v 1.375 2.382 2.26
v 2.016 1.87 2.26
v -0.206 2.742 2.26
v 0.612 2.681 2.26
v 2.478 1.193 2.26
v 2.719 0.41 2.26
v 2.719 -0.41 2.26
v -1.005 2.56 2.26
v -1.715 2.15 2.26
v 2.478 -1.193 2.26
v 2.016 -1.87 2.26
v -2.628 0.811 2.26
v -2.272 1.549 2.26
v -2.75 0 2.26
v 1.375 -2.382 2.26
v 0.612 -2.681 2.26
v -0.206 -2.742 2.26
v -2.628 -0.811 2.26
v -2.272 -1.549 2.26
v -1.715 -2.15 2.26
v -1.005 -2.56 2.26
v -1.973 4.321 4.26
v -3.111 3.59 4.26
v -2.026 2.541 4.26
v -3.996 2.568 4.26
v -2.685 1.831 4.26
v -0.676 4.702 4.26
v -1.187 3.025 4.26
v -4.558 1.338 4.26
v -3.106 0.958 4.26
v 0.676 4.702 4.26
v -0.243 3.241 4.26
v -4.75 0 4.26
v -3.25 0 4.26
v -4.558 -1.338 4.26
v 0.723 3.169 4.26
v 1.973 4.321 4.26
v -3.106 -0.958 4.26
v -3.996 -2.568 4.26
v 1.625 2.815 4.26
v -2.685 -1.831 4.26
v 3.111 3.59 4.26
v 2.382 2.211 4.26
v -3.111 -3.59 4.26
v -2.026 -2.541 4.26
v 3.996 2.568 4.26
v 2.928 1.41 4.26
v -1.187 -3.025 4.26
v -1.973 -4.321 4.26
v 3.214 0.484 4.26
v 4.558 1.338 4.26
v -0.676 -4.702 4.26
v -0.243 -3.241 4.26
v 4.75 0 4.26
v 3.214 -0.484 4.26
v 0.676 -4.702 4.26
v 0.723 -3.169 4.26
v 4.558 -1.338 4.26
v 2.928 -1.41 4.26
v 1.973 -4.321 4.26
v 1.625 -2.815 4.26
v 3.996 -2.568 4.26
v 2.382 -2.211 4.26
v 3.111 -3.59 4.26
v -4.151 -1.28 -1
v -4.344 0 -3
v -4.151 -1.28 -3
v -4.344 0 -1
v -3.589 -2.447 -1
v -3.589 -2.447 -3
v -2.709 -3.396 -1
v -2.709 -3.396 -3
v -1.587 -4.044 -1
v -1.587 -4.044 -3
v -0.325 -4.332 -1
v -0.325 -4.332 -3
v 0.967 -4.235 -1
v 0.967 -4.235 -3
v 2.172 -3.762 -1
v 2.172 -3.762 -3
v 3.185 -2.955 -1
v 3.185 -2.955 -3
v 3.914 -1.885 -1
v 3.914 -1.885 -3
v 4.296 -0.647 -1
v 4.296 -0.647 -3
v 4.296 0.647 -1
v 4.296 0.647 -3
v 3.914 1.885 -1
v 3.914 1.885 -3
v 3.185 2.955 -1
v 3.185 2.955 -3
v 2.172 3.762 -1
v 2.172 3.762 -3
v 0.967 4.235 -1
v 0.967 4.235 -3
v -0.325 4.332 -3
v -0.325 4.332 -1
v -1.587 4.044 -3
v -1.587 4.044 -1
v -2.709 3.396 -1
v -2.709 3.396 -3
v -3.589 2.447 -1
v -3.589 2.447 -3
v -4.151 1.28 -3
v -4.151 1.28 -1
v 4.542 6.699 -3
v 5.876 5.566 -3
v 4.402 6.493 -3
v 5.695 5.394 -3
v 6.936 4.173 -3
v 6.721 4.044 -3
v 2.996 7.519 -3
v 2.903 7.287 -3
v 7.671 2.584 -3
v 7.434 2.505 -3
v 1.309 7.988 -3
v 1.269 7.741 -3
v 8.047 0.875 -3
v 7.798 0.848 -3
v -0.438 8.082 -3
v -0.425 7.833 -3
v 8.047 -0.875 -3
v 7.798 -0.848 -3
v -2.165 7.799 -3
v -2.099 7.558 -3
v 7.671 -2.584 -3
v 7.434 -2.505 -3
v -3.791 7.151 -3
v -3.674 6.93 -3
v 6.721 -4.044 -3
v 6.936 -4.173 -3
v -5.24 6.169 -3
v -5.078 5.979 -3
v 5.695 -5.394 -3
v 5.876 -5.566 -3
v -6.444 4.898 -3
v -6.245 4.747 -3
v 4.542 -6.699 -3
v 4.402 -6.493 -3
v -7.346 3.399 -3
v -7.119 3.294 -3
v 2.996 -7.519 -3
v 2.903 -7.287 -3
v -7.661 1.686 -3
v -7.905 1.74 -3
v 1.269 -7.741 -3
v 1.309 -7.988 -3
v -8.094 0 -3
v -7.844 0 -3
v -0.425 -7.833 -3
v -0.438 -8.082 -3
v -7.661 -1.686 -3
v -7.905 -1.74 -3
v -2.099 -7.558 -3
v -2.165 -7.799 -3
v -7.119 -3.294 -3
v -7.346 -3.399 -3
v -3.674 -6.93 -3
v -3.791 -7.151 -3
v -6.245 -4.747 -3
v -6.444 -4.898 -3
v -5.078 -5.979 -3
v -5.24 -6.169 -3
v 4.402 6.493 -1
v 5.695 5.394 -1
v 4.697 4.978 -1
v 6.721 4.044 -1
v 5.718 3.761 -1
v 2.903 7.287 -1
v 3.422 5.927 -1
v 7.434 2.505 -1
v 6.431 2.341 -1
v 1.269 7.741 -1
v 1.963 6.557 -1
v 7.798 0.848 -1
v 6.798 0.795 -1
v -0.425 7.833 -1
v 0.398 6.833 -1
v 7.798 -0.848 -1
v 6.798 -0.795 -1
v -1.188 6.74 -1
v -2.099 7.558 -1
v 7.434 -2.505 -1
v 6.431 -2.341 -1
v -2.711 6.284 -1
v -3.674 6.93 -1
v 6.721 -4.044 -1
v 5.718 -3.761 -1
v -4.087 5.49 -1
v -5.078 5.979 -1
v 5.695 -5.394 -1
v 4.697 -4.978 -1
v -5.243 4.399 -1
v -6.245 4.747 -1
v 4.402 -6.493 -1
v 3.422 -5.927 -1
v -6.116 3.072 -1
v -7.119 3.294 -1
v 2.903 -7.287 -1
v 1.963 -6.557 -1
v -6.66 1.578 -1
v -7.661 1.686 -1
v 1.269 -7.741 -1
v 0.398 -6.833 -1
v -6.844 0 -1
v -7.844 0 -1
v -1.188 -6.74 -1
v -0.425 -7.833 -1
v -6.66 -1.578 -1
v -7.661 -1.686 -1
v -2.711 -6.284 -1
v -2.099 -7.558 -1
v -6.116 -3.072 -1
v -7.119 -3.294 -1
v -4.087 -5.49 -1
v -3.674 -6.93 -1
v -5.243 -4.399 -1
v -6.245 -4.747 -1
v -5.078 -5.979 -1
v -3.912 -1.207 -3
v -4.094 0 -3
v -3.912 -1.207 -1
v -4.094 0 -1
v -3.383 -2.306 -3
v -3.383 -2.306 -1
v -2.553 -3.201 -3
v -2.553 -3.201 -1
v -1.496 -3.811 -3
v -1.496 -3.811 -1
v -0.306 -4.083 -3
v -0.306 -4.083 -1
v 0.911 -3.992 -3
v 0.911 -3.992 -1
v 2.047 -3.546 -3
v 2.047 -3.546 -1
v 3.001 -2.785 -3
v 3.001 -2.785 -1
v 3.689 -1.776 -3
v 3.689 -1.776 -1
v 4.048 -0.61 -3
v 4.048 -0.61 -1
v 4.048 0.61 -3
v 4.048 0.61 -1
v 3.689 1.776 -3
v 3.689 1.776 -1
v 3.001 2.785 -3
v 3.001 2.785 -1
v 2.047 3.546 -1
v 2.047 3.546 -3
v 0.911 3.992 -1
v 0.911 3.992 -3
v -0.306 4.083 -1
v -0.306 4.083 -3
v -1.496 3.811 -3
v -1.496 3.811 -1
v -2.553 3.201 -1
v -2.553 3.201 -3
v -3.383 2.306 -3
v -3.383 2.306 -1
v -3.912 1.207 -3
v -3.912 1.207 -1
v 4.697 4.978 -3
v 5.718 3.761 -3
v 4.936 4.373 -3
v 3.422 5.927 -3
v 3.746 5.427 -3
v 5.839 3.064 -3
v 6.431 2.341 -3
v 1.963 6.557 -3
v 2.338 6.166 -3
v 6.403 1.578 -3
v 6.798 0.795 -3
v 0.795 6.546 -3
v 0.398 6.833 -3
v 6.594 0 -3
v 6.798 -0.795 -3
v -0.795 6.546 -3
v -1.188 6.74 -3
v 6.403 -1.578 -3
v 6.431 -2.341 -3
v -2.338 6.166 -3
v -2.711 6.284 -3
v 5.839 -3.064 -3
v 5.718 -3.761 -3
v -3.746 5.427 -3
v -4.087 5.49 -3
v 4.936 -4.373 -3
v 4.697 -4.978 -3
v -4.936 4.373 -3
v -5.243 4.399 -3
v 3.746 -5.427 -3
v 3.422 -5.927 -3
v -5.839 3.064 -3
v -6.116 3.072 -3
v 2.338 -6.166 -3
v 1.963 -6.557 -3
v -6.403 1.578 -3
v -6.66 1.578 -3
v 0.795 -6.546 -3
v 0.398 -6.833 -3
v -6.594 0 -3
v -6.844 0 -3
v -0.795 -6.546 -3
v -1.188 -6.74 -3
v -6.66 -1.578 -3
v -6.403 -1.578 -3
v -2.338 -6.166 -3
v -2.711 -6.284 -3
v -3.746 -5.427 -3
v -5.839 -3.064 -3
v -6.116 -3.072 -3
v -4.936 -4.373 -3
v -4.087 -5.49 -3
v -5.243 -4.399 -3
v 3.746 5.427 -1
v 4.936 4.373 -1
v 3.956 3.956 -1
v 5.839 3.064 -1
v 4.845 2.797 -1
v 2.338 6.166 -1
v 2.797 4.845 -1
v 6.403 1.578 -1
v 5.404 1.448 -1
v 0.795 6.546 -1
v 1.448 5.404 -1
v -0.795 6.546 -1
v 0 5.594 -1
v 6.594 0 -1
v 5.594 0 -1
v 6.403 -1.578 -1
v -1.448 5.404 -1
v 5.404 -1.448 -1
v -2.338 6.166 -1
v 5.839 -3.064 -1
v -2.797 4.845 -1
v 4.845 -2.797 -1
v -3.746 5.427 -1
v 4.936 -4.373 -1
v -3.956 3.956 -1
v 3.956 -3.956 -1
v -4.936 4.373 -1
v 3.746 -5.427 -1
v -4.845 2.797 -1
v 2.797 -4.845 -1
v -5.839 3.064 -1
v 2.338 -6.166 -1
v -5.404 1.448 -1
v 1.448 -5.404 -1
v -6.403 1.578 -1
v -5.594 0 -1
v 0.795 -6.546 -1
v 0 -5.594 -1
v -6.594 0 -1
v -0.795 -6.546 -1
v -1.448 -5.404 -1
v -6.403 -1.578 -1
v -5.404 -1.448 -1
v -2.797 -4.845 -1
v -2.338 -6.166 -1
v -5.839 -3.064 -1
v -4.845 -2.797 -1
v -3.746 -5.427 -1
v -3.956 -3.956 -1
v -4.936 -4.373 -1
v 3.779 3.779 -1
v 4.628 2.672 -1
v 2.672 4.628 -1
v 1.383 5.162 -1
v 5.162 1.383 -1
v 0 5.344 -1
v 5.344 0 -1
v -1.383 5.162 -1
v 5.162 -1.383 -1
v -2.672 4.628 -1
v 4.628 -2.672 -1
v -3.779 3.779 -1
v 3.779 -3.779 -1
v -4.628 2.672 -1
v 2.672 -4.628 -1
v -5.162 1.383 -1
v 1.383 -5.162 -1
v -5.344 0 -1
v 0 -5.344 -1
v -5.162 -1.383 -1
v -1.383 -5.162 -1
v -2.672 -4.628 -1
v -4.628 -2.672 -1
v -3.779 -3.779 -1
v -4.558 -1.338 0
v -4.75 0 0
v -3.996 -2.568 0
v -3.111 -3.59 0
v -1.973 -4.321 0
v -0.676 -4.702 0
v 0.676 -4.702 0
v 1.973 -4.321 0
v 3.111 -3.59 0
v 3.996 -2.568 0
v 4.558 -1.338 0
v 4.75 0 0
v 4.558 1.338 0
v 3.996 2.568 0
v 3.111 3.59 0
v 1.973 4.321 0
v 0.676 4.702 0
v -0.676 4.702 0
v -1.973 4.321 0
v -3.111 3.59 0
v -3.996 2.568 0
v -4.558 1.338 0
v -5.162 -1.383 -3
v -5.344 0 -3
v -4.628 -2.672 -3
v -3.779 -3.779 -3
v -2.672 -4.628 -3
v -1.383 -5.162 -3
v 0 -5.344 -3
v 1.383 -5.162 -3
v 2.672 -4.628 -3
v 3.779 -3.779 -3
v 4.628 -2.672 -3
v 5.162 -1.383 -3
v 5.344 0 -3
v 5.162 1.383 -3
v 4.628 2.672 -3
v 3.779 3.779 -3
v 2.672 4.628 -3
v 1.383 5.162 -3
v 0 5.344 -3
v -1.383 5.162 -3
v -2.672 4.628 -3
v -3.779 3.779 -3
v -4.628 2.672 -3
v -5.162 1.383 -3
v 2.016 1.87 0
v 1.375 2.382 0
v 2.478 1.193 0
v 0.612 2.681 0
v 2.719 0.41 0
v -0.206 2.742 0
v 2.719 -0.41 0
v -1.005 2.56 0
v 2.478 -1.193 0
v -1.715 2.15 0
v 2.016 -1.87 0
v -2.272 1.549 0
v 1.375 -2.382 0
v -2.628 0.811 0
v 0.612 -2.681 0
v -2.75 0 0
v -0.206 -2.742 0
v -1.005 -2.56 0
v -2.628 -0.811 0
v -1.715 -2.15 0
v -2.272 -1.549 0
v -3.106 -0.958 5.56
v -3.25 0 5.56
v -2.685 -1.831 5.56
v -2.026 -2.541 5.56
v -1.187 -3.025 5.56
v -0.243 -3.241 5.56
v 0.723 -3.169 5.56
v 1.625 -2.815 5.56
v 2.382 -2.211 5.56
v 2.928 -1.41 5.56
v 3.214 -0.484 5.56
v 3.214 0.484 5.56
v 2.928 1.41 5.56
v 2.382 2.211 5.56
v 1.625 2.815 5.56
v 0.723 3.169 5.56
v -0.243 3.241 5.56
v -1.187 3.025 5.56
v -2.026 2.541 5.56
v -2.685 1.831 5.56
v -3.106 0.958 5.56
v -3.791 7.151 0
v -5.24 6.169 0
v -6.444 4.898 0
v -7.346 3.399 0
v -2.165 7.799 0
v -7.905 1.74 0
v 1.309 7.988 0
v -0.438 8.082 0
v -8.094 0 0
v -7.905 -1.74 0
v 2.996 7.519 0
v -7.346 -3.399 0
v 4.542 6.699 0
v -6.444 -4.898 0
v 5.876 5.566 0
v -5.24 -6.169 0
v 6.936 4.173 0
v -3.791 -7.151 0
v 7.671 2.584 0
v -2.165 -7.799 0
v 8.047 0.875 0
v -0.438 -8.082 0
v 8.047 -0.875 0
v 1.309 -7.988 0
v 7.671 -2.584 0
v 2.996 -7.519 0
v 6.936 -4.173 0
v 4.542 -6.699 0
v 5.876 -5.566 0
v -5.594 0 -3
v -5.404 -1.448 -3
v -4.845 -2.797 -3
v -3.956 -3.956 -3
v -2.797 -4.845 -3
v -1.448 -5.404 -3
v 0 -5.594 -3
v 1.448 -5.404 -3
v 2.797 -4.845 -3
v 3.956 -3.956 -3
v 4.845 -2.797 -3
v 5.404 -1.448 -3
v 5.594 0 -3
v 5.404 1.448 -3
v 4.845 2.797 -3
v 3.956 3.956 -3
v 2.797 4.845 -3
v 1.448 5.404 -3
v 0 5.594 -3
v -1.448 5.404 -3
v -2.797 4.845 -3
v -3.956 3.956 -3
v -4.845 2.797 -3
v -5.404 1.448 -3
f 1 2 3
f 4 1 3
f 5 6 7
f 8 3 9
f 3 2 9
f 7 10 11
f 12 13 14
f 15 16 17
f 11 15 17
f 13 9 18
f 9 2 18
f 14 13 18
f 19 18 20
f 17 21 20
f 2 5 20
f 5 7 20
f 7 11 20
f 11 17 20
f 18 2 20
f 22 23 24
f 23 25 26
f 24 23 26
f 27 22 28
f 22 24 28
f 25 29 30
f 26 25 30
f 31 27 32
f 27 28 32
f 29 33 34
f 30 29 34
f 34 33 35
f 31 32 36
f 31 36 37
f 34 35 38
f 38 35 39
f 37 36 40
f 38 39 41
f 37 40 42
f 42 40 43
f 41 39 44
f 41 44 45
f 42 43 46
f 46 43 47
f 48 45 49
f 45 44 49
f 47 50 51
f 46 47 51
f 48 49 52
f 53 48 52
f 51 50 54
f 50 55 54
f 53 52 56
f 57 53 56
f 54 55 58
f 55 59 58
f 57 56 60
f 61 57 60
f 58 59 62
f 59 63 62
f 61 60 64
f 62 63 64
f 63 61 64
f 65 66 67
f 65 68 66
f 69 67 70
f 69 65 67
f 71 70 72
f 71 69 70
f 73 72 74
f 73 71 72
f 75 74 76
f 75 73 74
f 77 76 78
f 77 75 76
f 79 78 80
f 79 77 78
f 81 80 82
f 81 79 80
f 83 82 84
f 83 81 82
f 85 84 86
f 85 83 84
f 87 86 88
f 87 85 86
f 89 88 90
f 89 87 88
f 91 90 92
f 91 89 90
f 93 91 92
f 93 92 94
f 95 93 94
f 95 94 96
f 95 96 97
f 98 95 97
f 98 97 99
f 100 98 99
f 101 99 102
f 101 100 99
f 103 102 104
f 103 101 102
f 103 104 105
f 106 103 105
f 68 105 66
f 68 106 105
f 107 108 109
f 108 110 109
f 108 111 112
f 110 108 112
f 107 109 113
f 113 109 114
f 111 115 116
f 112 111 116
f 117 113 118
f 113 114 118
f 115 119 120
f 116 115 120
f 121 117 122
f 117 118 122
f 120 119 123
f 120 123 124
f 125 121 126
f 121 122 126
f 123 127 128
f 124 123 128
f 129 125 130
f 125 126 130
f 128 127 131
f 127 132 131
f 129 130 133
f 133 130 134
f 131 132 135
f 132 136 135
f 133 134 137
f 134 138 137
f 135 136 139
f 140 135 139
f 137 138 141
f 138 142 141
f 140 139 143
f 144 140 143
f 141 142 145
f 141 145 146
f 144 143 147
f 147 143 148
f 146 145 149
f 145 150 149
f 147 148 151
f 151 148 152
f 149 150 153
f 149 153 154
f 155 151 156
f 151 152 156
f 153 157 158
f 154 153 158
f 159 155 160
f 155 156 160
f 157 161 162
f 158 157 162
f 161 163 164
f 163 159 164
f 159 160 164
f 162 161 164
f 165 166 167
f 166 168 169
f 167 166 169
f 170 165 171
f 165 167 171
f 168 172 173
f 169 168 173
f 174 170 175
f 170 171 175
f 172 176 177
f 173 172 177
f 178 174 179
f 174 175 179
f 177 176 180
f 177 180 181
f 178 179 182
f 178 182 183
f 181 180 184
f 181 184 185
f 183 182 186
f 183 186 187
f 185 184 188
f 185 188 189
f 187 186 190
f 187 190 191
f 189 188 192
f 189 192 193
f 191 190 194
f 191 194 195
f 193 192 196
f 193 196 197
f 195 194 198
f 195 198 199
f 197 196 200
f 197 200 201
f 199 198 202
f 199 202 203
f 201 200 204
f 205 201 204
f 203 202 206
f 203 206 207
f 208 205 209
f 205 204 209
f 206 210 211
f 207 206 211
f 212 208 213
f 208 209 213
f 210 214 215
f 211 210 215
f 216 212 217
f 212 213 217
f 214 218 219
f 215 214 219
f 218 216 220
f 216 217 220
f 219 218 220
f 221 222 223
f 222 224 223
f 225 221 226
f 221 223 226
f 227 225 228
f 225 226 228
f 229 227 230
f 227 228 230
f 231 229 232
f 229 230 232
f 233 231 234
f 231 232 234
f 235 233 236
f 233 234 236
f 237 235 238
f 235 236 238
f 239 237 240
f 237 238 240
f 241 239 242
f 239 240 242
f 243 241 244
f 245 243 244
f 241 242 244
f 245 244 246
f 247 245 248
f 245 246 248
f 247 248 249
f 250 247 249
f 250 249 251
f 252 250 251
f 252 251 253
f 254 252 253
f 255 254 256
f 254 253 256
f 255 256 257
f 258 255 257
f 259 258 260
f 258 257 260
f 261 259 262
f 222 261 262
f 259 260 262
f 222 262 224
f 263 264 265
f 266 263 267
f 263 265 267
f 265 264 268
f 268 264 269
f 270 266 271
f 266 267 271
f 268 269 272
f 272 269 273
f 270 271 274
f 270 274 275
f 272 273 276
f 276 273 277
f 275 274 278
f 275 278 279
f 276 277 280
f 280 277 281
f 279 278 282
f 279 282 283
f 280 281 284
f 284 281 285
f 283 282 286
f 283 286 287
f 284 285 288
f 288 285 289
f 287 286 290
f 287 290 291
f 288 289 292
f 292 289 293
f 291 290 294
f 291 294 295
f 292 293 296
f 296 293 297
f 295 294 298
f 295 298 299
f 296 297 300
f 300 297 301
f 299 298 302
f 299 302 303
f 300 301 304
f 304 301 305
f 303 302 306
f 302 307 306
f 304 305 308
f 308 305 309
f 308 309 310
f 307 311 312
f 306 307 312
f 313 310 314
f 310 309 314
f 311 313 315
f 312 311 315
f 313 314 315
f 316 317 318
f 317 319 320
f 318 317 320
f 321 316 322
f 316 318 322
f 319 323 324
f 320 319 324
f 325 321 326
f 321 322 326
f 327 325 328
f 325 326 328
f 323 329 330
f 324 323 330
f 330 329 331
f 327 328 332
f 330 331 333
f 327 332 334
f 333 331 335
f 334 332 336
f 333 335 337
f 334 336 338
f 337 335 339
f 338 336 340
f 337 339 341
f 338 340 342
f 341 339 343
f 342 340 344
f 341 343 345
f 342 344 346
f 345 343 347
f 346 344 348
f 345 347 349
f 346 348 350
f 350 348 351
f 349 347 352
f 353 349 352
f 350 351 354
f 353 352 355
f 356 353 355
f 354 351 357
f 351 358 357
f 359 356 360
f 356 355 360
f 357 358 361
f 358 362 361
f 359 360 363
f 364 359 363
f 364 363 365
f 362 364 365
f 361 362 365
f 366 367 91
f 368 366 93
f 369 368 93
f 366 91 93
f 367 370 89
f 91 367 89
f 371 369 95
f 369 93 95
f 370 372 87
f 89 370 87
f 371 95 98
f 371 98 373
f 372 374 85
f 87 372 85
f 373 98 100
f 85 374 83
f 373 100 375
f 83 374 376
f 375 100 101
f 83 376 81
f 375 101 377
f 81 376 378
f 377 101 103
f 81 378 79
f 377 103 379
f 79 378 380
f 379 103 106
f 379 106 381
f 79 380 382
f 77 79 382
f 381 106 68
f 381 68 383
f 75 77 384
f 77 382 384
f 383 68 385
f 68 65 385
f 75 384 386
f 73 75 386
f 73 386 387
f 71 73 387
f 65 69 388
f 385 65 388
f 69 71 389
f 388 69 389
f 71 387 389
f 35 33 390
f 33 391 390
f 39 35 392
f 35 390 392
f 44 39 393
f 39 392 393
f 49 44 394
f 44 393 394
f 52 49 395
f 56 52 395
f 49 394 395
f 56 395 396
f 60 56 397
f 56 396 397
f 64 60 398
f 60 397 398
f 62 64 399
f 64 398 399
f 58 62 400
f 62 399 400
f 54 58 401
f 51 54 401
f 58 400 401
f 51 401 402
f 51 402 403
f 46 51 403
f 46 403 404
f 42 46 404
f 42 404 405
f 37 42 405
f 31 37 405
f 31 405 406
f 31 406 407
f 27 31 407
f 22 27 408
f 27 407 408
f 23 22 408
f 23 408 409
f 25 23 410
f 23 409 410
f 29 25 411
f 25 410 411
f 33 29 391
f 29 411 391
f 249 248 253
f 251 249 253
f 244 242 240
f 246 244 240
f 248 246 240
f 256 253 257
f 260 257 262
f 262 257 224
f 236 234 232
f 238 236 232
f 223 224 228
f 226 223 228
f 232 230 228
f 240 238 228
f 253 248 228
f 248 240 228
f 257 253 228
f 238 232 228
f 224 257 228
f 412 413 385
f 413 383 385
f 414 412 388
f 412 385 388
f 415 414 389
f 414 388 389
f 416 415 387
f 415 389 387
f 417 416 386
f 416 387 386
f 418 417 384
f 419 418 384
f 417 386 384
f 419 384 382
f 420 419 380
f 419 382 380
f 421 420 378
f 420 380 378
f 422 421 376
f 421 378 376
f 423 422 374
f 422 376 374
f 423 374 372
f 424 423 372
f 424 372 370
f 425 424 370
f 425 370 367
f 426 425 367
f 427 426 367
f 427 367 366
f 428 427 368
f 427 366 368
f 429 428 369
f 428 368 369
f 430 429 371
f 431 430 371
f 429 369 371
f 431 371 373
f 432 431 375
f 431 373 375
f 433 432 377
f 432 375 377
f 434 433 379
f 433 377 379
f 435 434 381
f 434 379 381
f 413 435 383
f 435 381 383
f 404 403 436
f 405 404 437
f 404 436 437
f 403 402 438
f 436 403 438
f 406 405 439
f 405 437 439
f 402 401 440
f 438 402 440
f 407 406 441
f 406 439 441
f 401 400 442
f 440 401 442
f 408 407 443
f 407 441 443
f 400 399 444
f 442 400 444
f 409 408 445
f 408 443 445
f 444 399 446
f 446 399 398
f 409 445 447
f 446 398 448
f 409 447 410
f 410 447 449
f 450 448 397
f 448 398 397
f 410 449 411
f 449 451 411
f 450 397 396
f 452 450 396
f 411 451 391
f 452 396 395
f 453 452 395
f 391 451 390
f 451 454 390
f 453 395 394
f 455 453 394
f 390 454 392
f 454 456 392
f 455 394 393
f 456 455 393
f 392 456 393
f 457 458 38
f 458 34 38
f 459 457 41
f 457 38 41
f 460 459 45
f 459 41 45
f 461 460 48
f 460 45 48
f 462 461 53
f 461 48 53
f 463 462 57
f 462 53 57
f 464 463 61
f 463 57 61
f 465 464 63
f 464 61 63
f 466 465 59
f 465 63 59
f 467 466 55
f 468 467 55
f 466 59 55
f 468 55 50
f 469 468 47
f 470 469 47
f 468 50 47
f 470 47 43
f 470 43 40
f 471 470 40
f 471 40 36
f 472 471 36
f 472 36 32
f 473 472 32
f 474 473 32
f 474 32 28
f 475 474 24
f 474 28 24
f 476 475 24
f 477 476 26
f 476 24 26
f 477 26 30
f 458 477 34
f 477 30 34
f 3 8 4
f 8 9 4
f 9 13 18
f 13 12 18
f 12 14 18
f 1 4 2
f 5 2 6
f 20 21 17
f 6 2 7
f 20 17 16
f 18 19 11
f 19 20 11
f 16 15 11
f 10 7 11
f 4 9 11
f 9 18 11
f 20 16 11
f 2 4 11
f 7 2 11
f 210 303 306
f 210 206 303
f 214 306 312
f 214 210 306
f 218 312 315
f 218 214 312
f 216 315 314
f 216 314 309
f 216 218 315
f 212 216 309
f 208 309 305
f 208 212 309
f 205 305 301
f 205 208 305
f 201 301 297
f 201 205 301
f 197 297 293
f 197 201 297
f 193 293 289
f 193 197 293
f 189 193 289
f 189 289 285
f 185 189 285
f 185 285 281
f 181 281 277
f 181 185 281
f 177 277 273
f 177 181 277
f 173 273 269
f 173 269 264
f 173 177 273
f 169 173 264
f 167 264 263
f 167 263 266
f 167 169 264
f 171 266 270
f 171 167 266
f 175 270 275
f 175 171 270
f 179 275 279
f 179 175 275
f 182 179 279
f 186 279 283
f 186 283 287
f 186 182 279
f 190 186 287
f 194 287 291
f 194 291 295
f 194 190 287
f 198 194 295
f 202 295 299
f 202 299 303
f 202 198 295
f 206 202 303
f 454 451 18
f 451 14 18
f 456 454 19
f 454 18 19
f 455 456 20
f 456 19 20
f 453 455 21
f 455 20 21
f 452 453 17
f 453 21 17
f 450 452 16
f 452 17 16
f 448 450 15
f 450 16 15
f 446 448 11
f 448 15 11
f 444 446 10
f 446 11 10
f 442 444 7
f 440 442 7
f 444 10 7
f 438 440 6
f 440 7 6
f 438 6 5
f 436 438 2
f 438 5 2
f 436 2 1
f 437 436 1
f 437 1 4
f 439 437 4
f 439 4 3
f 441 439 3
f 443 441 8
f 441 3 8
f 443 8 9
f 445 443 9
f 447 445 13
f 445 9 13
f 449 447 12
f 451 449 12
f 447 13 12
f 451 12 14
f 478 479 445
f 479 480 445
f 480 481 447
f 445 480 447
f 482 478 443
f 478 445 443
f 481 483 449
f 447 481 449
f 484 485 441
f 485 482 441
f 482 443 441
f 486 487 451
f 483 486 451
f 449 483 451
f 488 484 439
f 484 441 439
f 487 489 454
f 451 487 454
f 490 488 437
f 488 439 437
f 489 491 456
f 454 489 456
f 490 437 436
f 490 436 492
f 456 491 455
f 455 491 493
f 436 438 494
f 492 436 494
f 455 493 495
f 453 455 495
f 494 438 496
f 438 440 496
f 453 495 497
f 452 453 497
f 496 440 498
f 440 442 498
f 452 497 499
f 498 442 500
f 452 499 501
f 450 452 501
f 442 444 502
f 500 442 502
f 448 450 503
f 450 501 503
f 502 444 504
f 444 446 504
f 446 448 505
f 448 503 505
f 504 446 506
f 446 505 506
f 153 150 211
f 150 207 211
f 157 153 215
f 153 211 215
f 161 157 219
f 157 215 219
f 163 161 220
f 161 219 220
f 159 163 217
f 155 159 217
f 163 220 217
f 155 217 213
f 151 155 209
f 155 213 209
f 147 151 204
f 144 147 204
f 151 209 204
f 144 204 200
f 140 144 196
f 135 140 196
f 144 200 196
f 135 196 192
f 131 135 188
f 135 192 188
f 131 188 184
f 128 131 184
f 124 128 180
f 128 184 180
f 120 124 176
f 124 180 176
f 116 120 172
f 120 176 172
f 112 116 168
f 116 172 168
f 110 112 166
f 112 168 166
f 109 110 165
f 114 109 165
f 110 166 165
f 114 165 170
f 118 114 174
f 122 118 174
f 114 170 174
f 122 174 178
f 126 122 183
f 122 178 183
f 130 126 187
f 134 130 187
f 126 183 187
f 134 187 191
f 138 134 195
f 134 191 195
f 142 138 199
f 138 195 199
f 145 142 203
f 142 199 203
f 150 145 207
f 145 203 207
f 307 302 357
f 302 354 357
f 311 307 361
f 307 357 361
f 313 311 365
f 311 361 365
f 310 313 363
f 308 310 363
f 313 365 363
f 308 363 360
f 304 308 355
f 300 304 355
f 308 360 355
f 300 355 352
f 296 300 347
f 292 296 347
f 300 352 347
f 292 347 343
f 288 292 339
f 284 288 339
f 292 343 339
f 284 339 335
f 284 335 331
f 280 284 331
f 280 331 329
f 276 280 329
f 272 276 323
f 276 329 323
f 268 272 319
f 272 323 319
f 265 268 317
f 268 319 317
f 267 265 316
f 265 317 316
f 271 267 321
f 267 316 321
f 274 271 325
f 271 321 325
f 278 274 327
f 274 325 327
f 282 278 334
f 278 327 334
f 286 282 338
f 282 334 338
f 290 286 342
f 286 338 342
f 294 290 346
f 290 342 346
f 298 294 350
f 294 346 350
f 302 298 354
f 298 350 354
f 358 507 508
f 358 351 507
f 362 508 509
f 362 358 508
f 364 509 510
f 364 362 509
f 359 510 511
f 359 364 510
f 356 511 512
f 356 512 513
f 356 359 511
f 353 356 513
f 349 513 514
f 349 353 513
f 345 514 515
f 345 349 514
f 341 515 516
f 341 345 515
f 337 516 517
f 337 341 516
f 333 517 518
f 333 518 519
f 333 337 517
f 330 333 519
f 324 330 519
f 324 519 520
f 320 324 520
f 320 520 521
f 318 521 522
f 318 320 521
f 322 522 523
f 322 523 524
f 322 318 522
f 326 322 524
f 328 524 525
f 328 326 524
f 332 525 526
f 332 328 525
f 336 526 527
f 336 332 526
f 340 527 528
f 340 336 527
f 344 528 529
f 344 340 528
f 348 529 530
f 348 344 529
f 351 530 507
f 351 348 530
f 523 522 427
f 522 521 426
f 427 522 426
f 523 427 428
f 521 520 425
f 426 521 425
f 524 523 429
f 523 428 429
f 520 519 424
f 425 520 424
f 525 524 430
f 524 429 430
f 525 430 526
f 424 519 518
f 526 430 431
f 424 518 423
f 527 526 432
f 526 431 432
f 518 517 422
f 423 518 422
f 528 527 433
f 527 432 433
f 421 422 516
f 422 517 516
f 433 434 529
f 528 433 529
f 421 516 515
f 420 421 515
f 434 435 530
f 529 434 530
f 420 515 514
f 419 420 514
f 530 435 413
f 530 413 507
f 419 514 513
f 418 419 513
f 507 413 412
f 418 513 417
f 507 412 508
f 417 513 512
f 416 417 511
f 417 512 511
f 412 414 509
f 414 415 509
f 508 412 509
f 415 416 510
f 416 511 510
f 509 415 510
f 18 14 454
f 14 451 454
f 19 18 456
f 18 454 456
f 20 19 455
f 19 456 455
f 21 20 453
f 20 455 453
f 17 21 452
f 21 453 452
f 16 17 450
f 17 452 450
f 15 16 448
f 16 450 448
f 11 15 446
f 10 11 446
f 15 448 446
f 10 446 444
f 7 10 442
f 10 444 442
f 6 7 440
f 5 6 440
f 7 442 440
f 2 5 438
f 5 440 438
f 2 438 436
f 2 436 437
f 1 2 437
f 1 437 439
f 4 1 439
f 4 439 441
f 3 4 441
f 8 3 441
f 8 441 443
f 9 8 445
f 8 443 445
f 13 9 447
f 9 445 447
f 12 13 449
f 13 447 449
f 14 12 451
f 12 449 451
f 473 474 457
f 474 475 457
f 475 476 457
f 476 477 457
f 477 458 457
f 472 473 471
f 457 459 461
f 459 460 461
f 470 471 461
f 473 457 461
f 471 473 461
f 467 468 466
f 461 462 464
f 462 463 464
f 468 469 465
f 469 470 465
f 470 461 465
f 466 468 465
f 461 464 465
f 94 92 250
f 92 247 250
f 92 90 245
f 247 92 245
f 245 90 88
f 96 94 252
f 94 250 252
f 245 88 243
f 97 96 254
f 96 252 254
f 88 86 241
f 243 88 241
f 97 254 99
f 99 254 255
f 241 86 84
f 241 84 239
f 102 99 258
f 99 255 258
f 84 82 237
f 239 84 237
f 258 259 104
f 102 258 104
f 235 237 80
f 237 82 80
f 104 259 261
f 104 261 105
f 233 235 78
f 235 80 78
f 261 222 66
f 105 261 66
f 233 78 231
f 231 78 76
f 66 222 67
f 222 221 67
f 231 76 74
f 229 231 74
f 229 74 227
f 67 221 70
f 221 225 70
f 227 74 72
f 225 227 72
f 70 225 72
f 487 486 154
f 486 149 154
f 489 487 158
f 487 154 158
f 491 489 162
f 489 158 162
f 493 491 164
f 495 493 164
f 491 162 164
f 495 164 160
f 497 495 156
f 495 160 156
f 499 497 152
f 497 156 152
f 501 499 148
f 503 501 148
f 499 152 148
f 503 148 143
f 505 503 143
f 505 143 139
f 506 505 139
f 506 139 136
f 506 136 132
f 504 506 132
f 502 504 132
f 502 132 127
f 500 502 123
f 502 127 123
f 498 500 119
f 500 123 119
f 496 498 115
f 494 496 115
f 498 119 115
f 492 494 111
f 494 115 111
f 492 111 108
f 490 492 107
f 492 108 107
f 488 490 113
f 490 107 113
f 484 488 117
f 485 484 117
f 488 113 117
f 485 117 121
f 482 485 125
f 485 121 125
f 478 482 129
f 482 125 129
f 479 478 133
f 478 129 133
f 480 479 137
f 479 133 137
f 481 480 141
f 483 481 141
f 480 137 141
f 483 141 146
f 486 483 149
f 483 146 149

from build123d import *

# Parameters (mm, degrees)
F0_W = 0.25
F0_H = 2


# Not quite as in the source:
# - a feature names something its author has since deleted; it is built from what else it names


with BuildPart() as f1:
    # F0 (on Front) → F1 (revolve)
    with BuildSketch(Plane.XZ):
        Polygon((0, 2.2599502219), (0, 5.5599502219), (-3.25, 5.5599502219), (-3.25, 4.2599502219), (-4.75, 4.2599502219), (-4.75, 0), (-2.75, 0), (-2.75, 2.2599502219), align=None)
    revolve(axis=Axis((0, 0, 3.9099502219), (0, 0, 1)))


with BuildPart() as f2:
    # F0 (on Front) → F2 (revolve)
    with BuildSketch(Plane.XZ):
        with Locations((-6.7192060259, -2)):
            Rectangle(F0_W, F0_H)
        with Locations((-5.4692060259, -2)):
            Rectangle(F0_W, F0_H)
        with Locations((-4.2192060259, -2)):
            Rectangle(F0_W, F0_H)
        Polygon((0, -1), (0, 2.2599502219), (-2.75, 2.2599502219), (-2.75, 0), (-4.75, 0), (-6.2268639432, 0), (-8.0942060259, 0), (-8.0942060259, -3), (-7.8442060259, -3), (-7.8442060259, -1), (-6.8442060259, -1), (-6.5942060259, -1), (-5.5942060259, -1), (-5.3442060259, -1), (-4.3442060259, -1), (-4.0942060259, -1), (-3.0942060259, -1), (-2.8442060259, -1), (-1.8442060259, -1), (-1.5942060259, -1), align=None)
    revolve(axis=Axis((0, 0, 0.6299751109), (0, 0, 1)))


solid = Compound([f1.part, f2.part])
